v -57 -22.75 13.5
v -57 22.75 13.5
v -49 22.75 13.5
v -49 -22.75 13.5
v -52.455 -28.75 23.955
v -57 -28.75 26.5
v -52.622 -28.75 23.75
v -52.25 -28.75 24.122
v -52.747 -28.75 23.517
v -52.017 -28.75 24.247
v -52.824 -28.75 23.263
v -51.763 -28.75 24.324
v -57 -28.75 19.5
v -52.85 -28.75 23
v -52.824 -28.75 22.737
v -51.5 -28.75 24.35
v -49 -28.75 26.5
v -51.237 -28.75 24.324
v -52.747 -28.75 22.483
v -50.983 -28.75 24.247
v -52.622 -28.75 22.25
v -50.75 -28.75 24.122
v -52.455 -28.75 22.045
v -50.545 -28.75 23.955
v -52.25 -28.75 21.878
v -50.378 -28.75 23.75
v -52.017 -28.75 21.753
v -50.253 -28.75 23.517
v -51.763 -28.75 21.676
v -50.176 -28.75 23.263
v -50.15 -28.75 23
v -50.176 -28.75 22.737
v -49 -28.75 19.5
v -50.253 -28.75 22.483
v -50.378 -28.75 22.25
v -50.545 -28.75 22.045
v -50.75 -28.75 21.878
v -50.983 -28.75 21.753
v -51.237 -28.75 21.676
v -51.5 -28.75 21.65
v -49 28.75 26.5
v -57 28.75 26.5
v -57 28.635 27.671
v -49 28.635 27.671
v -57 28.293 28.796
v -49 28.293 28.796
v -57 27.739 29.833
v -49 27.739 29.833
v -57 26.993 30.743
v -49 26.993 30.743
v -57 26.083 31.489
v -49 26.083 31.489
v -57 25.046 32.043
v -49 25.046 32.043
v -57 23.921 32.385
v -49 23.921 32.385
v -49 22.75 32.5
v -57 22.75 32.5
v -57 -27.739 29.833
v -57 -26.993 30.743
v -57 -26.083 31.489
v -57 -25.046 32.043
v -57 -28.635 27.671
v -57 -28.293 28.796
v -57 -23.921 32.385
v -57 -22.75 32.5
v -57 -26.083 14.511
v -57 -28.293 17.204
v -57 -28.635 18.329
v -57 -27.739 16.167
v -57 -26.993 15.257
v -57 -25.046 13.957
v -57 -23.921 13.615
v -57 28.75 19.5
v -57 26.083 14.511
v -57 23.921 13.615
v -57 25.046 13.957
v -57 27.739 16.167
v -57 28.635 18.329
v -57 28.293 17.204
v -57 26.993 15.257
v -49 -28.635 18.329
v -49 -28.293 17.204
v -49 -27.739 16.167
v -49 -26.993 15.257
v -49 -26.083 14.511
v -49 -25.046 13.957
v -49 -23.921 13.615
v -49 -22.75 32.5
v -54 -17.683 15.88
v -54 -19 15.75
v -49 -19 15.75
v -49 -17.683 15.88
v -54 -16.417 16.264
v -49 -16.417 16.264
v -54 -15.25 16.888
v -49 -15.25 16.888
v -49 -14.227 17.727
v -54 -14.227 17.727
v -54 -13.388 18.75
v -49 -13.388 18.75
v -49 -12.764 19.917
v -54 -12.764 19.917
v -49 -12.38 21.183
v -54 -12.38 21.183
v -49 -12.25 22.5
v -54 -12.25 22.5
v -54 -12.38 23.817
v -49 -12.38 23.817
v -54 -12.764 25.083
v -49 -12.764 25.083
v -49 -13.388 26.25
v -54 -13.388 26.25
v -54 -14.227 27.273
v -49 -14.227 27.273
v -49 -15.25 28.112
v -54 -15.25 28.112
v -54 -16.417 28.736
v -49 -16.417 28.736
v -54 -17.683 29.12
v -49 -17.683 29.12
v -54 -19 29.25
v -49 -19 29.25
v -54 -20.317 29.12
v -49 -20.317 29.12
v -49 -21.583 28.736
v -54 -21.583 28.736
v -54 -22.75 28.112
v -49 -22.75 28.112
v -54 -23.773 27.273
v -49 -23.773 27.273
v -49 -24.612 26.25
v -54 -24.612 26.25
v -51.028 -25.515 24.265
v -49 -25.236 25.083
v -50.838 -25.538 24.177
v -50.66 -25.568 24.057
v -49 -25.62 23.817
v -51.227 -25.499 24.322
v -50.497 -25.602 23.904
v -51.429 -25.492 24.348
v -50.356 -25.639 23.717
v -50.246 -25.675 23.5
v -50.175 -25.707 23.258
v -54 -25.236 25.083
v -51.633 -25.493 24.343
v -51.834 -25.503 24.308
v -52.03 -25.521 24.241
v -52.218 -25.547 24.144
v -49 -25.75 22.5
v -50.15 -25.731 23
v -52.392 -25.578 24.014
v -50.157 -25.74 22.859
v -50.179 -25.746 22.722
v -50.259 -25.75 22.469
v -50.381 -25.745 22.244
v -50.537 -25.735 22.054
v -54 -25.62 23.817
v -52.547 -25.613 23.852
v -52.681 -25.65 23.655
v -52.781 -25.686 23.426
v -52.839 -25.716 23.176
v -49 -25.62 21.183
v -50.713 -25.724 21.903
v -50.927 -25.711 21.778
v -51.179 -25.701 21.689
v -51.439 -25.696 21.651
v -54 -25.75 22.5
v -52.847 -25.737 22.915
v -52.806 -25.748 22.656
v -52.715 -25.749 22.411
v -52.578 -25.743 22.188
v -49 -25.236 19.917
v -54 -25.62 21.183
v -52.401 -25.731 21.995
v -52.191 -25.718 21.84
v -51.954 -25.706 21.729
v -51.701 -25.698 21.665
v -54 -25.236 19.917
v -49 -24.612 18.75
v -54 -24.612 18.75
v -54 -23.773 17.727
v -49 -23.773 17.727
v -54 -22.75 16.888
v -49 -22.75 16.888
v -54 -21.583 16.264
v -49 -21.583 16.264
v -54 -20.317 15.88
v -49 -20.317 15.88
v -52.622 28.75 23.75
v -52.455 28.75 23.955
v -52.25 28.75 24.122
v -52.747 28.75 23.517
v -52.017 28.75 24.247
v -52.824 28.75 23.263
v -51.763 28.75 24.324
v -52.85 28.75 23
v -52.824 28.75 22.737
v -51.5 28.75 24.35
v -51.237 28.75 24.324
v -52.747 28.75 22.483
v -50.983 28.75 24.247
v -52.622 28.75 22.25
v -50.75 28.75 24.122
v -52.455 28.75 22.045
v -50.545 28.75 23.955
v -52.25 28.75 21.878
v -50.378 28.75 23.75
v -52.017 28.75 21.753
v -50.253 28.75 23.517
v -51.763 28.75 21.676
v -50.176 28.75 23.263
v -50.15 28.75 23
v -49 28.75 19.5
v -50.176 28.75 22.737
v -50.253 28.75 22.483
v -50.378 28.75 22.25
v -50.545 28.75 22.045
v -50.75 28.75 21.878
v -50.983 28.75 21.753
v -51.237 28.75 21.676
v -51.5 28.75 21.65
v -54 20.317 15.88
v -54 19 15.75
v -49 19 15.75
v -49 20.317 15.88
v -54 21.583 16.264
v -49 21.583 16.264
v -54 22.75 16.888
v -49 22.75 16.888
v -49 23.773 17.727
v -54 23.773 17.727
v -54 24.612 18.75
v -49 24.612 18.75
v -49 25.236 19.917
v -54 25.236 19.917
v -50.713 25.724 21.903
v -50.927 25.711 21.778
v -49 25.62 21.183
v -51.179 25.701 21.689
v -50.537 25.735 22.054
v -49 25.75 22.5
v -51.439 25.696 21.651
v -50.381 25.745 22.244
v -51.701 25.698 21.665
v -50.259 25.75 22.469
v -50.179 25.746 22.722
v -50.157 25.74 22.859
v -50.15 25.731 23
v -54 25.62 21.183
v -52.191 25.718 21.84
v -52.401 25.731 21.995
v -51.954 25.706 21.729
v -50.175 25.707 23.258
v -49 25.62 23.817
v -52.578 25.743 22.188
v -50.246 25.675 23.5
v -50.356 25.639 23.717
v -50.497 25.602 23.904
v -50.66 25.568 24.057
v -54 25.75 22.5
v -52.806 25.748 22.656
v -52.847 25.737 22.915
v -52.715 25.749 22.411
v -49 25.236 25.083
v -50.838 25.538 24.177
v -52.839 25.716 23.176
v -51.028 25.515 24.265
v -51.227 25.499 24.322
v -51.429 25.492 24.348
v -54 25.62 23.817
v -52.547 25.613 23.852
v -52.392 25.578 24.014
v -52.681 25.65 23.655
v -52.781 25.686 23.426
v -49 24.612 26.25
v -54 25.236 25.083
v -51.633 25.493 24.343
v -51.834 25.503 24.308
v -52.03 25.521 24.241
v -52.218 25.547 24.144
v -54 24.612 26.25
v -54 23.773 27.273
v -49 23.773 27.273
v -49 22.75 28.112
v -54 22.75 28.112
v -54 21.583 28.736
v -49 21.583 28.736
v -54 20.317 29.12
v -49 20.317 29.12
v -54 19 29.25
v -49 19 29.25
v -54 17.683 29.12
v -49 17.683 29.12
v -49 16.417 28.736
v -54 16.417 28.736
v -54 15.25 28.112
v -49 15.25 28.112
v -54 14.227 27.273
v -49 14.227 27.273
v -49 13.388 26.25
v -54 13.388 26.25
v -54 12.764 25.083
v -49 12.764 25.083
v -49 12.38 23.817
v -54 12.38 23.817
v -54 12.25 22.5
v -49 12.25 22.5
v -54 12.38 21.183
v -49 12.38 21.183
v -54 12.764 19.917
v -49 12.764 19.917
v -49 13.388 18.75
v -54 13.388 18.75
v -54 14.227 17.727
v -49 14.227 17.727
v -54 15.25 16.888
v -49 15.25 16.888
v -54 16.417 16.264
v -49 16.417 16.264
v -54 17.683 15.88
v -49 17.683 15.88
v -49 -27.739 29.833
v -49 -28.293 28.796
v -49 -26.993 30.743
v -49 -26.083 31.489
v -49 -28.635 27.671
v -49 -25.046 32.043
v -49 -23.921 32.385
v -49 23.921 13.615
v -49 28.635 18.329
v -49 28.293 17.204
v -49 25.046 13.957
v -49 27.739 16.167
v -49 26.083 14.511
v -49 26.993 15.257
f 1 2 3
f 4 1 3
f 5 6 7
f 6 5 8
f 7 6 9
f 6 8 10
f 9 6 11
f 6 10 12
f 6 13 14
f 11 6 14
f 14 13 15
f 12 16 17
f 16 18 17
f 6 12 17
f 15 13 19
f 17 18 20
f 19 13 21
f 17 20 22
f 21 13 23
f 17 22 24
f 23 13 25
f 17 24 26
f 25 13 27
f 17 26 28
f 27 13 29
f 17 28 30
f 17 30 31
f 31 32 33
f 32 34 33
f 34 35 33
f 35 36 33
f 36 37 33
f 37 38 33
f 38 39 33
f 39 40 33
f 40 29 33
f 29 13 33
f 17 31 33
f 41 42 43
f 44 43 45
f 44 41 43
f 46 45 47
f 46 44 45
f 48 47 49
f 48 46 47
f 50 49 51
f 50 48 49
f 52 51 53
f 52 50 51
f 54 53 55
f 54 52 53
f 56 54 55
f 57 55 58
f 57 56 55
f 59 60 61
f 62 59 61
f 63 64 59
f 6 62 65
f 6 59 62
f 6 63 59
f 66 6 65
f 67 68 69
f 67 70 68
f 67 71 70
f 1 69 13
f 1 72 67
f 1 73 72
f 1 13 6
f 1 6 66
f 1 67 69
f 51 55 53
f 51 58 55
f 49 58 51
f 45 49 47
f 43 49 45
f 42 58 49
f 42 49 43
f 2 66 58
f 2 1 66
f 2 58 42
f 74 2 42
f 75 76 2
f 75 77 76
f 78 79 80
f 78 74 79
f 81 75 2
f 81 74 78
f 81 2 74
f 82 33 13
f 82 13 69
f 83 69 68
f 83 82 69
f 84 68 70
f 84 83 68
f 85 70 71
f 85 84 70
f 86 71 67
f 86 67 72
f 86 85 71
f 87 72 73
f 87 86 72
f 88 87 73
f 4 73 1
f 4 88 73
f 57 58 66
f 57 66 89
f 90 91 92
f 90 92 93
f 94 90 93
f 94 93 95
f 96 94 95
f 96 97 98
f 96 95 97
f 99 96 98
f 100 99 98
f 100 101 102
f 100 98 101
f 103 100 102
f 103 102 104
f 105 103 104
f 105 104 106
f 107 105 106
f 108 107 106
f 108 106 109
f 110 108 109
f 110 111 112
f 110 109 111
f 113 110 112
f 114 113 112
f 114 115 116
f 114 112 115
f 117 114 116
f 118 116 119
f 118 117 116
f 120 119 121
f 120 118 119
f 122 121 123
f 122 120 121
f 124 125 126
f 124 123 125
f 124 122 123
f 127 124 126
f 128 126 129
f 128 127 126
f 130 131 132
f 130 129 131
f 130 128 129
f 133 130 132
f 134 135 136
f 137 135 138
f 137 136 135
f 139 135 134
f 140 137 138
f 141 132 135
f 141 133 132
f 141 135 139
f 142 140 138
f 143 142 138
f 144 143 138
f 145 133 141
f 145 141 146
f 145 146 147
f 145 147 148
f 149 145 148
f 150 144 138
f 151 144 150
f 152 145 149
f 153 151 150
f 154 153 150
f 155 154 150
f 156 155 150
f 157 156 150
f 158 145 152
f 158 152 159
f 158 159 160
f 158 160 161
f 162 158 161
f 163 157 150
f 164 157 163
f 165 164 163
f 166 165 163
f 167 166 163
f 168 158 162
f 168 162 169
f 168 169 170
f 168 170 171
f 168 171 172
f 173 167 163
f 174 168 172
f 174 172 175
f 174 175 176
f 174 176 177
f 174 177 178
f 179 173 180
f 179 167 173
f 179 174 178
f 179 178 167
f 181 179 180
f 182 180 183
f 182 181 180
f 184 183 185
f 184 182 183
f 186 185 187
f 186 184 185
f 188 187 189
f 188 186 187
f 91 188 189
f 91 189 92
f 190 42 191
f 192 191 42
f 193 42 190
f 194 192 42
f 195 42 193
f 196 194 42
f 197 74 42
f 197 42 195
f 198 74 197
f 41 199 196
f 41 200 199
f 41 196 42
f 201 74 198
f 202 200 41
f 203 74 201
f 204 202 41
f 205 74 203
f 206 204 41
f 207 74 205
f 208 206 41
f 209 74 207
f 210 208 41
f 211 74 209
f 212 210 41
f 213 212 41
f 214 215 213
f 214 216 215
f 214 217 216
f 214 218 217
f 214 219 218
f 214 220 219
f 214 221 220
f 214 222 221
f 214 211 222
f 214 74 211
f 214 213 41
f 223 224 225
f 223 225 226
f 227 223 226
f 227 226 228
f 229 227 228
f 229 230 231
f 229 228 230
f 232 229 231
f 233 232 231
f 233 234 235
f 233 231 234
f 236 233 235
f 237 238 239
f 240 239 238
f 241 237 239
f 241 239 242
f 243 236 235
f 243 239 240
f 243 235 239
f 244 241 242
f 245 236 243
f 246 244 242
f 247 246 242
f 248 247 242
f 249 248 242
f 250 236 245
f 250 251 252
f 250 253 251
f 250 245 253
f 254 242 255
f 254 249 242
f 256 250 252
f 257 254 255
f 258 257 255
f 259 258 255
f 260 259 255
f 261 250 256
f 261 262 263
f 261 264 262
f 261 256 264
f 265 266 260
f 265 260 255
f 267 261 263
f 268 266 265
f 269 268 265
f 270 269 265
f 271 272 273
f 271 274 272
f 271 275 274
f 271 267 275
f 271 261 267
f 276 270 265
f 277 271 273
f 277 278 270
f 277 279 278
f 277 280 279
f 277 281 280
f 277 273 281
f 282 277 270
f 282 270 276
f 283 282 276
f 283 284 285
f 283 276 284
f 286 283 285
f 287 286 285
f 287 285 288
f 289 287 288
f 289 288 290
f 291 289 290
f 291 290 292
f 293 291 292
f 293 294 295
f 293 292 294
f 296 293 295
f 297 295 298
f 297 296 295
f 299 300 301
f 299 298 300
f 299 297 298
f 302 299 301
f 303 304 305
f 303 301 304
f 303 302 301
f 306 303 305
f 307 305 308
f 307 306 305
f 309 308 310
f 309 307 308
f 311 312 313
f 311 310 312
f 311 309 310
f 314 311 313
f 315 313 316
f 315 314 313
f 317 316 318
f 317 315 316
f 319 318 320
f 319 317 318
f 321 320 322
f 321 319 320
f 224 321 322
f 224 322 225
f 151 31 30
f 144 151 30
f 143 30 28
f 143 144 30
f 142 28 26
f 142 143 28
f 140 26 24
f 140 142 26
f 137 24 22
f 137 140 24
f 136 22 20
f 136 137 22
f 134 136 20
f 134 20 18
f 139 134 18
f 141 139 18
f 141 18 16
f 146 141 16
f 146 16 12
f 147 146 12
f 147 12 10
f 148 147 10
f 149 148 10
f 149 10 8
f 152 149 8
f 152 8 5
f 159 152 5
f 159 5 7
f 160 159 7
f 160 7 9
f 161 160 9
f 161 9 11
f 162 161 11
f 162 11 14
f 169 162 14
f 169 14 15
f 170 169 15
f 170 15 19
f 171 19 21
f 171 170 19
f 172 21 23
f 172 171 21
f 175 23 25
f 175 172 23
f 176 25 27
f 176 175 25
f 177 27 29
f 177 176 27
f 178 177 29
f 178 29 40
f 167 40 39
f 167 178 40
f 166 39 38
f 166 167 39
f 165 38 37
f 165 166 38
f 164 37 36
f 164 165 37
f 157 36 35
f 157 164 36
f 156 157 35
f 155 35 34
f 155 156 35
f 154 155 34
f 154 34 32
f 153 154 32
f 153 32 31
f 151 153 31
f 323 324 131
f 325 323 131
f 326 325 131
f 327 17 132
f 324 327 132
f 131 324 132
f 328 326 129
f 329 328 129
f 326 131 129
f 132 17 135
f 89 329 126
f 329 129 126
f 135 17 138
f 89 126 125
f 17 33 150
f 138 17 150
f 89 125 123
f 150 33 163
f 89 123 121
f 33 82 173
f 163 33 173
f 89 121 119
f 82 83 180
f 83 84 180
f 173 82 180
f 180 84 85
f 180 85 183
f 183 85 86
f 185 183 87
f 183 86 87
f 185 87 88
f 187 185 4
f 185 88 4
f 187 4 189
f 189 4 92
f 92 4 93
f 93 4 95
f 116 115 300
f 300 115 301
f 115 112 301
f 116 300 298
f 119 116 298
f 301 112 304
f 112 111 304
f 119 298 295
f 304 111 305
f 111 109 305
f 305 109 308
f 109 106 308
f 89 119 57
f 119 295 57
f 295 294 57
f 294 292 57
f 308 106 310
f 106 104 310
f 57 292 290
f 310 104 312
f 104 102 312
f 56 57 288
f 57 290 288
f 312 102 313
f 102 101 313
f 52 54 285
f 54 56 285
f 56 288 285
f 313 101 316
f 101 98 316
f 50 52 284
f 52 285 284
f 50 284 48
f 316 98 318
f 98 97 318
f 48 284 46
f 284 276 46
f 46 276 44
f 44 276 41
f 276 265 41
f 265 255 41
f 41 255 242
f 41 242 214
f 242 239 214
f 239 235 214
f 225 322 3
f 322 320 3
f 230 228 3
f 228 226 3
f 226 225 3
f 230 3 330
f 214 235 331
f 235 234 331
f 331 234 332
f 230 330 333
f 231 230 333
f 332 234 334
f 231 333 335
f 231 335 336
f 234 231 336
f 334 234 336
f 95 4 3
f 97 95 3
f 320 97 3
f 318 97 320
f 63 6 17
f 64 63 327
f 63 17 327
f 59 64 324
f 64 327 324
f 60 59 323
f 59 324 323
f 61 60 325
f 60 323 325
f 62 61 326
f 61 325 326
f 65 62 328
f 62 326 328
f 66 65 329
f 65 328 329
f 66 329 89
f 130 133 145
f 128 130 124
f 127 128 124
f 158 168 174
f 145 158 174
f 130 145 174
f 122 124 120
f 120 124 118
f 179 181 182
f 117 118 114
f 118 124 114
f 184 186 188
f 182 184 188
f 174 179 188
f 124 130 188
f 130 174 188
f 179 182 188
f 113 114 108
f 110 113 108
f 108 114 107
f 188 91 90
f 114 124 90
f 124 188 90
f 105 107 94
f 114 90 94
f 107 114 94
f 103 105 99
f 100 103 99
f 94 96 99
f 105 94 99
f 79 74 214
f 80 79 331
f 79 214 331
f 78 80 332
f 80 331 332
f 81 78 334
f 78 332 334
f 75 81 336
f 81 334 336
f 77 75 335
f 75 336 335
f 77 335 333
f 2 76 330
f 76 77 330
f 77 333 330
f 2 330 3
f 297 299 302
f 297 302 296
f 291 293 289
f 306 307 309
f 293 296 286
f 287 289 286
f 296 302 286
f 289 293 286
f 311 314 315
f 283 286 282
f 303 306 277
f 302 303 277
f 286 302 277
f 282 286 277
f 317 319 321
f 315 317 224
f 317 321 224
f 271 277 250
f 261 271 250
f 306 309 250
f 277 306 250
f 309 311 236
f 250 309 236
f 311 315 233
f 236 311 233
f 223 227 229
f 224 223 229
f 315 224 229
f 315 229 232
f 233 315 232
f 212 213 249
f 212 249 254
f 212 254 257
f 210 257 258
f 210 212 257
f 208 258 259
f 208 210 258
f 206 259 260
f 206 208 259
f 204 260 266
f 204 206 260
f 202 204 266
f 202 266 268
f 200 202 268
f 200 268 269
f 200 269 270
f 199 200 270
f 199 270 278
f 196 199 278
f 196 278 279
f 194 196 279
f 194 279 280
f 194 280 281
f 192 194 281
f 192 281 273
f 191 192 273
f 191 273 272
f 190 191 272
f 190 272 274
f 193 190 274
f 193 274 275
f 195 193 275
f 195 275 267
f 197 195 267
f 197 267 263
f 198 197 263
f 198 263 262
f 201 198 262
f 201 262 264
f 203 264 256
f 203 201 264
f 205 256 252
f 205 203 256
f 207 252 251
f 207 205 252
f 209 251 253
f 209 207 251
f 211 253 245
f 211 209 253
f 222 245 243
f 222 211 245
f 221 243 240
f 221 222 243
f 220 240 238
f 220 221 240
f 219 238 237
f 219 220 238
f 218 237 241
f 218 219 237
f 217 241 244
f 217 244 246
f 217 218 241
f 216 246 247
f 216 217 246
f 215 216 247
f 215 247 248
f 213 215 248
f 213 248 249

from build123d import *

# Parameters (mm, degrees)
BOX008_W          = 10
BOX008_H          = 64
BOX008_DEPTH      = 42
BOX006_W          = 5
BOX006_H          = 57.5
BOX006_DEPTH      = 19
FILLET008_R       = 6
CYLINDER027_R     = 1.35
CYLINDER027_DEPTH = 10
CYLINDER025_R     = 1.35
CYLINDER025_DEPTH = 10
CYLINDER028_R     = 6.75
CYLINDER028_DEPTH = 50
CYLINDER026_R     = 6.75
CYLINDER026_DEPTH = 50
BOX007_W          = 5
BOX007_H          = 57.5
BOX007_DEPTH      = 19
FILLET009_R       = 6


with BuildPart() as cube008:
    # Box008 → Box008 (new body)
    with BuildSketch(Plane(origin=(-32, -32, 0), x_dir=(1, 0, 0), z_dir=(0, 0, 1))):
        with Locations((5, 32)):
            Rectangle(BOX008_W, BOX008_H)
    extrude(amount=BOX008_DEPTH)


with BuildPart() as cut024:
    # Box006 → Box006 (new body)
    with BuildSketch(Plane(origin=(0, -28.75, 13.5), x_dir=(1, 0, 0), z_dir=(0, 0, 1))):
        with Locations((2.5, 28.75)):
            Rectangle(BOX006_W, BOX006_H)
    extrude(amount=BOX006_DEPTH)

    # Fillet008
    fillet008_edges = [cut024.edges().sort_by_distance(p)[0] for p in [
        (2.5, -28.75, 13.5),
        (2.5, -28.75, 32.5),
        (2.5, 28.75, 13.5),
        (2.5, 28.75, 32.5),
    ]]
    fillet(fillet008_edges, radius=FILLET008_R)


with BuildPart() as cut024_1:
    # Fillet008 placement: moved
    add(cut024.part.moved(Location((-24, 0, 0))))

    # Cut024: cut Cube008
    add(cube008.part, mode=Mode.SUBTRACT)


with BuildPart() as cut024_2:
    # Cut024 placement: moved
    add(cut024_1.part.moved(Location((19, 0, 0))))


with BuildPart() as cylinder019:
    # Cylinder027 → Cylinder027 (new body)
    with BuildSketch(Plane(origin=(2.5, -22, 23), x_dir=(1, 0, 0), z_dir=(0, -1, 0))):
        Circle(CYLINDER027_R)
    extrude(amount=CYLINDER027_DEPTH)


with BuildPart() as cylinder018:
    # Cylinder025 → Cylinder025 (new body)
    with BuildSketch(Plane(origin=(2.5, 32, 23), x_dir=(1, 0, 0), z_dir=(0, -1, 0))):
        Circle(CYLINDER025_R)
    extrude(amount=CYLINDER025_DEPTH)


with BuildPart() as tubo008:
    # Cylinder028 → Cylinder028 (new body)
    with BuildSketch(Plane(origin=(-24, 19, 22.5), x_dir=(0, 0, -1), z_dir=(1, 0, 0))):
        Circle(CYLINDER028_R)
    extrude(amount=CYLINDER028_DEPTH)


with BuildPart() as tubo007:
    # Cylinder026 → Cylinder026 (new body)
    with BuildSketch(Plane(origin=(-24, -19, 22.5), x_dir=(0, 0, -1), z_dir=(1, 0, 0))):
        Circle(CYLINDER026_R)
    extrude(amount=CYLINDER026_DEPTH)


with BuildPart() as soporte_tapa_tubos:
    # Box007 → Box007 (new body)
    with BuildSketch(Plane(origin=(0, -28.75, 13.5), x_dir=(1, 0, 0), z_dir=(0, 0, 1))):
        with Locations((2.5, 28.75)):
            Rectangle(BOX007_W, BOX007_H)
    extrude(amount=BOX007_DEPTH)

    # Fillet009
    fillet009_edges = [soporte_tapa_tubos.edges().sort_by_distance(p)[0] for p in [
        (2.5, -28.75, 13.5),
        (2.5, -28.75, 32.5),
        (2.5, 28.75, 13.5),
        (2.5, 28.75, 32.5),
    ]]
    fillet(fillet009_edges, radius=FILLET009_R)

    # Cut022: cut tubo007
    add(tubo007.part, mode=Mode.SUBTRACT)

    # Cut020: cut tubo008
    add(tubo008.part, mode=Mode.SUBTRACT)

    # Cut023: cut Cylinder018
    add(cylinder018.part, mode=Mode.SUBTRACT)

    # Cut021: cut Cylinder019
    add(cylinder019.part, mode=Mode.SUBTRACT)

    # Fusion007: union Cut024
    add(cut024_2.part)


with BuildPart() as soporte_tapa_tubos_1:
    # Fusion007 placement: moved
    add(soporte_tapa_tubos.part.moved(Location((-54, 0, 0))))


solid = soporte_tapa_tubos_1.part
